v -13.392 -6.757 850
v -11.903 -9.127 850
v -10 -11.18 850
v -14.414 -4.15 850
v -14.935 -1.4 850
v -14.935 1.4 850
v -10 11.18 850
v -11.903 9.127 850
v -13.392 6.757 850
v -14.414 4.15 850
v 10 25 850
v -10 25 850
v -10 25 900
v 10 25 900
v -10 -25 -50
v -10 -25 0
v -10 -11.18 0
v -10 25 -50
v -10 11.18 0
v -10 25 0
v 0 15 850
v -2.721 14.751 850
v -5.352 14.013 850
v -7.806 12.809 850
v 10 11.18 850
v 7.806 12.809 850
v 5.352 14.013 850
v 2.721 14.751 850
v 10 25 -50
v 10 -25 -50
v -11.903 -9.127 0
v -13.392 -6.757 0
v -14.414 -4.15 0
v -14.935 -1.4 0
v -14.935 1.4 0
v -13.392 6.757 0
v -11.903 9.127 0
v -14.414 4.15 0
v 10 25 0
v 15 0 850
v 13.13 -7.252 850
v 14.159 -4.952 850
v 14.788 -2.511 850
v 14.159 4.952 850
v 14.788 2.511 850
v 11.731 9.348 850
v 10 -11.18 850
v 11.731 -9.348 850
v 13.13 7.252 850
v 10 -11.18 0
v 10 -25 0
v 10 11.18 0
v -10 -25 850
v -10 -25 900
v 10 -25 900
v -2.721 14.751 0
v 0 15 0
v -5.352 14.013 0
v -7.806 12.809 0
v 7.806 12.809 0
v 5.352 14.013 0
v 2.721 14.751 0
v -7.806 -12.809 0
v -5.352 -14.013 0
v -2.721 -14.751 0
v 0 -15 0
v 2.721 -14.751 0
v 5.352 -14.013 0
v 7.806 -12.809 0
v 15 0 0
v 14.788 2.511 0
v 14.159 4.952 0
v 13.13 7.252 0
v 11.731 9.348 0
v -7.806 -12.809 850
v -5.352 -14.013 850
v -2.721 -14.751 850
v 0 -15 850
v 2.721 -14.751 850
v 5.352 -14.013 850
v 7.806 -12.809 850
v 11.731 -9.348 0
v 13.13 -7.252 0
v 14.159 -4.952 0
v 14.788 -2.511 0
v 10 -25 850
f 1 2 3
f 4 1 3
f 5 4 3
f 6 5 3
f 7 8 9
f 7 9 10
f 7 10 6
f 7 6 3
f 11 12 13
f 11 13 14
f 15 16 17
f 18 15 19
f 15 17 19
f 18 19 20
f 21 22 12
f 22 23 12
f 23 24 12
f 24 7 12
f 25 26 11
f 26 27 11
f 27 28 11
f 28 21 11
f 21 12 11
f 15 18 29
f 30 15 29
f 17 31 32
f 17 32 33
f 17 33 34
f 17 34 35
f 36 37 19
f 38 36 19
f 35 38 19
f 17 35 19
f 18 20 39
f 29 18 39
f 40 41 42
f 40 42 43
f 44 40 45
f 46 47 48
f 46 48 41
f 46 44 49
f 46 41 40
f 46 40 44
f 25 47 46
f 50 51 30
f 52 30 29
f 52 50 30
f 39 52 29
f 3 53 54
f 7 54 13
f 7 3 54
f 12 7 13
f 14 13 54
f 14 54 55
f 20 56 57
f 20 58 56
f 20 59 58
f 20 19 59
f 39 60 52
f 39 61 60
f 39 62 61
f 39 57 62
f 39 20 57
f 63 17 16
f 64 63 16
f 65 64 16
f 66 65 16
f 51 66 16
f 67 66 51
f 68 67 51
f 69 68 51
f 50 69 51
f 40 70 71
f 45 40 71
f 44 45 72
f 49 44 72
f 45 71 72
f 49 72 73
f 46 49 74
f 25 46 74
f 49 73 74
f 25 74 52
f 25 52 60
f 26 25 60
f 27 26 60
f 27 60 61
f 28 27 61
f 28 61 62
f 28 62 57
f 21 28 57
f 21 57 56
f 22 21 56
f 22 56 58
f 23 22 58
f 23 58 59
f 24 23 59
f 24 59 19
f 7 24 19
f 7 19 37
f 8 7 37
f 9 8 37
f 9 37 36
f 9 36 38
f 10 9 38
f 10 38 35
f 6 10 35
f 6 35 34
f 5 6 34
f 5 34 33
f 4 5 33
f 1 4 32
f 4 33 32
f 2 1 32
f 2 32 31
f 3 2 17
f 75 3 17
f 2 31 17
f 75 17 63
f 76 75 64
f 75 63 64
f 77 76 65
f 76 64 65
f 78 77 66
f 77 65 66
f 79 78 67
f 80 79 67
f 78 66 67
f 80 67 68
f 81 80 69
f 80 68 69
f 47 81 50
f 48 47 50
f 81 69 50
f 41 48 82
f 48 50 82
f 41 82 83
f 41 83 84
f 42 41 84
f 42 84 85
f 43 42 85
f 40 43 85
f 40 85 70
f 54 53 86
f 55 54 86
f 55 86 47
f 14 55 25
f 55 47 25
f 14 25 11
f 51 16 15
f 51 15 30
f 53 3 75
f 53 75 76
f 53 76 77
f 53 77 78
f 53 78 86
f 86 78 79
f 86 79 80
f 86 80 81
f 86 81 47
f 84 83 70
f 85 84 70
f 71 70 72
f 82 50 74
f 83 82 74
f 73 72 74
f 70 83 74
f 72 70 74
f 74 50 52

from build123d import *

# Parameters (mm, degrees)
SKETCH1_R           = 15
BOSS_EXTRUDE1_DEPTH = 850
SKETCH3_W           = 20
SKETCH3_H           = 50
BOSS_EXTRUDE2_DEPTH = 50


with BuildPart() as part:
    # Sketch1 → Boss-Extrude1 (new body)
    with BuildSketch(Plane.XY):
        Circle(SKETCH1_R)
    extrude(amount=BOSS_EXTRUDE1_DEPTH)

    # Sketch3 → Boss-Extrude2 (add)
    with BuildSketch(Plane.XY.offset(850)):
        Rectangle(SKETCH3_W, SKETCH3_H)
    boss_extrude2 = extrude(amount=BOSS_EXTRUDE2_DEPTH)

    # Mirror1: Boss-Extrude2 across plane
    add(boss_extrude2.mirror(Plane(origin=(0, 0, 425), x_dir=(1, 0, 0), z_dir=(0, 0, -1))))


solid = part.part
